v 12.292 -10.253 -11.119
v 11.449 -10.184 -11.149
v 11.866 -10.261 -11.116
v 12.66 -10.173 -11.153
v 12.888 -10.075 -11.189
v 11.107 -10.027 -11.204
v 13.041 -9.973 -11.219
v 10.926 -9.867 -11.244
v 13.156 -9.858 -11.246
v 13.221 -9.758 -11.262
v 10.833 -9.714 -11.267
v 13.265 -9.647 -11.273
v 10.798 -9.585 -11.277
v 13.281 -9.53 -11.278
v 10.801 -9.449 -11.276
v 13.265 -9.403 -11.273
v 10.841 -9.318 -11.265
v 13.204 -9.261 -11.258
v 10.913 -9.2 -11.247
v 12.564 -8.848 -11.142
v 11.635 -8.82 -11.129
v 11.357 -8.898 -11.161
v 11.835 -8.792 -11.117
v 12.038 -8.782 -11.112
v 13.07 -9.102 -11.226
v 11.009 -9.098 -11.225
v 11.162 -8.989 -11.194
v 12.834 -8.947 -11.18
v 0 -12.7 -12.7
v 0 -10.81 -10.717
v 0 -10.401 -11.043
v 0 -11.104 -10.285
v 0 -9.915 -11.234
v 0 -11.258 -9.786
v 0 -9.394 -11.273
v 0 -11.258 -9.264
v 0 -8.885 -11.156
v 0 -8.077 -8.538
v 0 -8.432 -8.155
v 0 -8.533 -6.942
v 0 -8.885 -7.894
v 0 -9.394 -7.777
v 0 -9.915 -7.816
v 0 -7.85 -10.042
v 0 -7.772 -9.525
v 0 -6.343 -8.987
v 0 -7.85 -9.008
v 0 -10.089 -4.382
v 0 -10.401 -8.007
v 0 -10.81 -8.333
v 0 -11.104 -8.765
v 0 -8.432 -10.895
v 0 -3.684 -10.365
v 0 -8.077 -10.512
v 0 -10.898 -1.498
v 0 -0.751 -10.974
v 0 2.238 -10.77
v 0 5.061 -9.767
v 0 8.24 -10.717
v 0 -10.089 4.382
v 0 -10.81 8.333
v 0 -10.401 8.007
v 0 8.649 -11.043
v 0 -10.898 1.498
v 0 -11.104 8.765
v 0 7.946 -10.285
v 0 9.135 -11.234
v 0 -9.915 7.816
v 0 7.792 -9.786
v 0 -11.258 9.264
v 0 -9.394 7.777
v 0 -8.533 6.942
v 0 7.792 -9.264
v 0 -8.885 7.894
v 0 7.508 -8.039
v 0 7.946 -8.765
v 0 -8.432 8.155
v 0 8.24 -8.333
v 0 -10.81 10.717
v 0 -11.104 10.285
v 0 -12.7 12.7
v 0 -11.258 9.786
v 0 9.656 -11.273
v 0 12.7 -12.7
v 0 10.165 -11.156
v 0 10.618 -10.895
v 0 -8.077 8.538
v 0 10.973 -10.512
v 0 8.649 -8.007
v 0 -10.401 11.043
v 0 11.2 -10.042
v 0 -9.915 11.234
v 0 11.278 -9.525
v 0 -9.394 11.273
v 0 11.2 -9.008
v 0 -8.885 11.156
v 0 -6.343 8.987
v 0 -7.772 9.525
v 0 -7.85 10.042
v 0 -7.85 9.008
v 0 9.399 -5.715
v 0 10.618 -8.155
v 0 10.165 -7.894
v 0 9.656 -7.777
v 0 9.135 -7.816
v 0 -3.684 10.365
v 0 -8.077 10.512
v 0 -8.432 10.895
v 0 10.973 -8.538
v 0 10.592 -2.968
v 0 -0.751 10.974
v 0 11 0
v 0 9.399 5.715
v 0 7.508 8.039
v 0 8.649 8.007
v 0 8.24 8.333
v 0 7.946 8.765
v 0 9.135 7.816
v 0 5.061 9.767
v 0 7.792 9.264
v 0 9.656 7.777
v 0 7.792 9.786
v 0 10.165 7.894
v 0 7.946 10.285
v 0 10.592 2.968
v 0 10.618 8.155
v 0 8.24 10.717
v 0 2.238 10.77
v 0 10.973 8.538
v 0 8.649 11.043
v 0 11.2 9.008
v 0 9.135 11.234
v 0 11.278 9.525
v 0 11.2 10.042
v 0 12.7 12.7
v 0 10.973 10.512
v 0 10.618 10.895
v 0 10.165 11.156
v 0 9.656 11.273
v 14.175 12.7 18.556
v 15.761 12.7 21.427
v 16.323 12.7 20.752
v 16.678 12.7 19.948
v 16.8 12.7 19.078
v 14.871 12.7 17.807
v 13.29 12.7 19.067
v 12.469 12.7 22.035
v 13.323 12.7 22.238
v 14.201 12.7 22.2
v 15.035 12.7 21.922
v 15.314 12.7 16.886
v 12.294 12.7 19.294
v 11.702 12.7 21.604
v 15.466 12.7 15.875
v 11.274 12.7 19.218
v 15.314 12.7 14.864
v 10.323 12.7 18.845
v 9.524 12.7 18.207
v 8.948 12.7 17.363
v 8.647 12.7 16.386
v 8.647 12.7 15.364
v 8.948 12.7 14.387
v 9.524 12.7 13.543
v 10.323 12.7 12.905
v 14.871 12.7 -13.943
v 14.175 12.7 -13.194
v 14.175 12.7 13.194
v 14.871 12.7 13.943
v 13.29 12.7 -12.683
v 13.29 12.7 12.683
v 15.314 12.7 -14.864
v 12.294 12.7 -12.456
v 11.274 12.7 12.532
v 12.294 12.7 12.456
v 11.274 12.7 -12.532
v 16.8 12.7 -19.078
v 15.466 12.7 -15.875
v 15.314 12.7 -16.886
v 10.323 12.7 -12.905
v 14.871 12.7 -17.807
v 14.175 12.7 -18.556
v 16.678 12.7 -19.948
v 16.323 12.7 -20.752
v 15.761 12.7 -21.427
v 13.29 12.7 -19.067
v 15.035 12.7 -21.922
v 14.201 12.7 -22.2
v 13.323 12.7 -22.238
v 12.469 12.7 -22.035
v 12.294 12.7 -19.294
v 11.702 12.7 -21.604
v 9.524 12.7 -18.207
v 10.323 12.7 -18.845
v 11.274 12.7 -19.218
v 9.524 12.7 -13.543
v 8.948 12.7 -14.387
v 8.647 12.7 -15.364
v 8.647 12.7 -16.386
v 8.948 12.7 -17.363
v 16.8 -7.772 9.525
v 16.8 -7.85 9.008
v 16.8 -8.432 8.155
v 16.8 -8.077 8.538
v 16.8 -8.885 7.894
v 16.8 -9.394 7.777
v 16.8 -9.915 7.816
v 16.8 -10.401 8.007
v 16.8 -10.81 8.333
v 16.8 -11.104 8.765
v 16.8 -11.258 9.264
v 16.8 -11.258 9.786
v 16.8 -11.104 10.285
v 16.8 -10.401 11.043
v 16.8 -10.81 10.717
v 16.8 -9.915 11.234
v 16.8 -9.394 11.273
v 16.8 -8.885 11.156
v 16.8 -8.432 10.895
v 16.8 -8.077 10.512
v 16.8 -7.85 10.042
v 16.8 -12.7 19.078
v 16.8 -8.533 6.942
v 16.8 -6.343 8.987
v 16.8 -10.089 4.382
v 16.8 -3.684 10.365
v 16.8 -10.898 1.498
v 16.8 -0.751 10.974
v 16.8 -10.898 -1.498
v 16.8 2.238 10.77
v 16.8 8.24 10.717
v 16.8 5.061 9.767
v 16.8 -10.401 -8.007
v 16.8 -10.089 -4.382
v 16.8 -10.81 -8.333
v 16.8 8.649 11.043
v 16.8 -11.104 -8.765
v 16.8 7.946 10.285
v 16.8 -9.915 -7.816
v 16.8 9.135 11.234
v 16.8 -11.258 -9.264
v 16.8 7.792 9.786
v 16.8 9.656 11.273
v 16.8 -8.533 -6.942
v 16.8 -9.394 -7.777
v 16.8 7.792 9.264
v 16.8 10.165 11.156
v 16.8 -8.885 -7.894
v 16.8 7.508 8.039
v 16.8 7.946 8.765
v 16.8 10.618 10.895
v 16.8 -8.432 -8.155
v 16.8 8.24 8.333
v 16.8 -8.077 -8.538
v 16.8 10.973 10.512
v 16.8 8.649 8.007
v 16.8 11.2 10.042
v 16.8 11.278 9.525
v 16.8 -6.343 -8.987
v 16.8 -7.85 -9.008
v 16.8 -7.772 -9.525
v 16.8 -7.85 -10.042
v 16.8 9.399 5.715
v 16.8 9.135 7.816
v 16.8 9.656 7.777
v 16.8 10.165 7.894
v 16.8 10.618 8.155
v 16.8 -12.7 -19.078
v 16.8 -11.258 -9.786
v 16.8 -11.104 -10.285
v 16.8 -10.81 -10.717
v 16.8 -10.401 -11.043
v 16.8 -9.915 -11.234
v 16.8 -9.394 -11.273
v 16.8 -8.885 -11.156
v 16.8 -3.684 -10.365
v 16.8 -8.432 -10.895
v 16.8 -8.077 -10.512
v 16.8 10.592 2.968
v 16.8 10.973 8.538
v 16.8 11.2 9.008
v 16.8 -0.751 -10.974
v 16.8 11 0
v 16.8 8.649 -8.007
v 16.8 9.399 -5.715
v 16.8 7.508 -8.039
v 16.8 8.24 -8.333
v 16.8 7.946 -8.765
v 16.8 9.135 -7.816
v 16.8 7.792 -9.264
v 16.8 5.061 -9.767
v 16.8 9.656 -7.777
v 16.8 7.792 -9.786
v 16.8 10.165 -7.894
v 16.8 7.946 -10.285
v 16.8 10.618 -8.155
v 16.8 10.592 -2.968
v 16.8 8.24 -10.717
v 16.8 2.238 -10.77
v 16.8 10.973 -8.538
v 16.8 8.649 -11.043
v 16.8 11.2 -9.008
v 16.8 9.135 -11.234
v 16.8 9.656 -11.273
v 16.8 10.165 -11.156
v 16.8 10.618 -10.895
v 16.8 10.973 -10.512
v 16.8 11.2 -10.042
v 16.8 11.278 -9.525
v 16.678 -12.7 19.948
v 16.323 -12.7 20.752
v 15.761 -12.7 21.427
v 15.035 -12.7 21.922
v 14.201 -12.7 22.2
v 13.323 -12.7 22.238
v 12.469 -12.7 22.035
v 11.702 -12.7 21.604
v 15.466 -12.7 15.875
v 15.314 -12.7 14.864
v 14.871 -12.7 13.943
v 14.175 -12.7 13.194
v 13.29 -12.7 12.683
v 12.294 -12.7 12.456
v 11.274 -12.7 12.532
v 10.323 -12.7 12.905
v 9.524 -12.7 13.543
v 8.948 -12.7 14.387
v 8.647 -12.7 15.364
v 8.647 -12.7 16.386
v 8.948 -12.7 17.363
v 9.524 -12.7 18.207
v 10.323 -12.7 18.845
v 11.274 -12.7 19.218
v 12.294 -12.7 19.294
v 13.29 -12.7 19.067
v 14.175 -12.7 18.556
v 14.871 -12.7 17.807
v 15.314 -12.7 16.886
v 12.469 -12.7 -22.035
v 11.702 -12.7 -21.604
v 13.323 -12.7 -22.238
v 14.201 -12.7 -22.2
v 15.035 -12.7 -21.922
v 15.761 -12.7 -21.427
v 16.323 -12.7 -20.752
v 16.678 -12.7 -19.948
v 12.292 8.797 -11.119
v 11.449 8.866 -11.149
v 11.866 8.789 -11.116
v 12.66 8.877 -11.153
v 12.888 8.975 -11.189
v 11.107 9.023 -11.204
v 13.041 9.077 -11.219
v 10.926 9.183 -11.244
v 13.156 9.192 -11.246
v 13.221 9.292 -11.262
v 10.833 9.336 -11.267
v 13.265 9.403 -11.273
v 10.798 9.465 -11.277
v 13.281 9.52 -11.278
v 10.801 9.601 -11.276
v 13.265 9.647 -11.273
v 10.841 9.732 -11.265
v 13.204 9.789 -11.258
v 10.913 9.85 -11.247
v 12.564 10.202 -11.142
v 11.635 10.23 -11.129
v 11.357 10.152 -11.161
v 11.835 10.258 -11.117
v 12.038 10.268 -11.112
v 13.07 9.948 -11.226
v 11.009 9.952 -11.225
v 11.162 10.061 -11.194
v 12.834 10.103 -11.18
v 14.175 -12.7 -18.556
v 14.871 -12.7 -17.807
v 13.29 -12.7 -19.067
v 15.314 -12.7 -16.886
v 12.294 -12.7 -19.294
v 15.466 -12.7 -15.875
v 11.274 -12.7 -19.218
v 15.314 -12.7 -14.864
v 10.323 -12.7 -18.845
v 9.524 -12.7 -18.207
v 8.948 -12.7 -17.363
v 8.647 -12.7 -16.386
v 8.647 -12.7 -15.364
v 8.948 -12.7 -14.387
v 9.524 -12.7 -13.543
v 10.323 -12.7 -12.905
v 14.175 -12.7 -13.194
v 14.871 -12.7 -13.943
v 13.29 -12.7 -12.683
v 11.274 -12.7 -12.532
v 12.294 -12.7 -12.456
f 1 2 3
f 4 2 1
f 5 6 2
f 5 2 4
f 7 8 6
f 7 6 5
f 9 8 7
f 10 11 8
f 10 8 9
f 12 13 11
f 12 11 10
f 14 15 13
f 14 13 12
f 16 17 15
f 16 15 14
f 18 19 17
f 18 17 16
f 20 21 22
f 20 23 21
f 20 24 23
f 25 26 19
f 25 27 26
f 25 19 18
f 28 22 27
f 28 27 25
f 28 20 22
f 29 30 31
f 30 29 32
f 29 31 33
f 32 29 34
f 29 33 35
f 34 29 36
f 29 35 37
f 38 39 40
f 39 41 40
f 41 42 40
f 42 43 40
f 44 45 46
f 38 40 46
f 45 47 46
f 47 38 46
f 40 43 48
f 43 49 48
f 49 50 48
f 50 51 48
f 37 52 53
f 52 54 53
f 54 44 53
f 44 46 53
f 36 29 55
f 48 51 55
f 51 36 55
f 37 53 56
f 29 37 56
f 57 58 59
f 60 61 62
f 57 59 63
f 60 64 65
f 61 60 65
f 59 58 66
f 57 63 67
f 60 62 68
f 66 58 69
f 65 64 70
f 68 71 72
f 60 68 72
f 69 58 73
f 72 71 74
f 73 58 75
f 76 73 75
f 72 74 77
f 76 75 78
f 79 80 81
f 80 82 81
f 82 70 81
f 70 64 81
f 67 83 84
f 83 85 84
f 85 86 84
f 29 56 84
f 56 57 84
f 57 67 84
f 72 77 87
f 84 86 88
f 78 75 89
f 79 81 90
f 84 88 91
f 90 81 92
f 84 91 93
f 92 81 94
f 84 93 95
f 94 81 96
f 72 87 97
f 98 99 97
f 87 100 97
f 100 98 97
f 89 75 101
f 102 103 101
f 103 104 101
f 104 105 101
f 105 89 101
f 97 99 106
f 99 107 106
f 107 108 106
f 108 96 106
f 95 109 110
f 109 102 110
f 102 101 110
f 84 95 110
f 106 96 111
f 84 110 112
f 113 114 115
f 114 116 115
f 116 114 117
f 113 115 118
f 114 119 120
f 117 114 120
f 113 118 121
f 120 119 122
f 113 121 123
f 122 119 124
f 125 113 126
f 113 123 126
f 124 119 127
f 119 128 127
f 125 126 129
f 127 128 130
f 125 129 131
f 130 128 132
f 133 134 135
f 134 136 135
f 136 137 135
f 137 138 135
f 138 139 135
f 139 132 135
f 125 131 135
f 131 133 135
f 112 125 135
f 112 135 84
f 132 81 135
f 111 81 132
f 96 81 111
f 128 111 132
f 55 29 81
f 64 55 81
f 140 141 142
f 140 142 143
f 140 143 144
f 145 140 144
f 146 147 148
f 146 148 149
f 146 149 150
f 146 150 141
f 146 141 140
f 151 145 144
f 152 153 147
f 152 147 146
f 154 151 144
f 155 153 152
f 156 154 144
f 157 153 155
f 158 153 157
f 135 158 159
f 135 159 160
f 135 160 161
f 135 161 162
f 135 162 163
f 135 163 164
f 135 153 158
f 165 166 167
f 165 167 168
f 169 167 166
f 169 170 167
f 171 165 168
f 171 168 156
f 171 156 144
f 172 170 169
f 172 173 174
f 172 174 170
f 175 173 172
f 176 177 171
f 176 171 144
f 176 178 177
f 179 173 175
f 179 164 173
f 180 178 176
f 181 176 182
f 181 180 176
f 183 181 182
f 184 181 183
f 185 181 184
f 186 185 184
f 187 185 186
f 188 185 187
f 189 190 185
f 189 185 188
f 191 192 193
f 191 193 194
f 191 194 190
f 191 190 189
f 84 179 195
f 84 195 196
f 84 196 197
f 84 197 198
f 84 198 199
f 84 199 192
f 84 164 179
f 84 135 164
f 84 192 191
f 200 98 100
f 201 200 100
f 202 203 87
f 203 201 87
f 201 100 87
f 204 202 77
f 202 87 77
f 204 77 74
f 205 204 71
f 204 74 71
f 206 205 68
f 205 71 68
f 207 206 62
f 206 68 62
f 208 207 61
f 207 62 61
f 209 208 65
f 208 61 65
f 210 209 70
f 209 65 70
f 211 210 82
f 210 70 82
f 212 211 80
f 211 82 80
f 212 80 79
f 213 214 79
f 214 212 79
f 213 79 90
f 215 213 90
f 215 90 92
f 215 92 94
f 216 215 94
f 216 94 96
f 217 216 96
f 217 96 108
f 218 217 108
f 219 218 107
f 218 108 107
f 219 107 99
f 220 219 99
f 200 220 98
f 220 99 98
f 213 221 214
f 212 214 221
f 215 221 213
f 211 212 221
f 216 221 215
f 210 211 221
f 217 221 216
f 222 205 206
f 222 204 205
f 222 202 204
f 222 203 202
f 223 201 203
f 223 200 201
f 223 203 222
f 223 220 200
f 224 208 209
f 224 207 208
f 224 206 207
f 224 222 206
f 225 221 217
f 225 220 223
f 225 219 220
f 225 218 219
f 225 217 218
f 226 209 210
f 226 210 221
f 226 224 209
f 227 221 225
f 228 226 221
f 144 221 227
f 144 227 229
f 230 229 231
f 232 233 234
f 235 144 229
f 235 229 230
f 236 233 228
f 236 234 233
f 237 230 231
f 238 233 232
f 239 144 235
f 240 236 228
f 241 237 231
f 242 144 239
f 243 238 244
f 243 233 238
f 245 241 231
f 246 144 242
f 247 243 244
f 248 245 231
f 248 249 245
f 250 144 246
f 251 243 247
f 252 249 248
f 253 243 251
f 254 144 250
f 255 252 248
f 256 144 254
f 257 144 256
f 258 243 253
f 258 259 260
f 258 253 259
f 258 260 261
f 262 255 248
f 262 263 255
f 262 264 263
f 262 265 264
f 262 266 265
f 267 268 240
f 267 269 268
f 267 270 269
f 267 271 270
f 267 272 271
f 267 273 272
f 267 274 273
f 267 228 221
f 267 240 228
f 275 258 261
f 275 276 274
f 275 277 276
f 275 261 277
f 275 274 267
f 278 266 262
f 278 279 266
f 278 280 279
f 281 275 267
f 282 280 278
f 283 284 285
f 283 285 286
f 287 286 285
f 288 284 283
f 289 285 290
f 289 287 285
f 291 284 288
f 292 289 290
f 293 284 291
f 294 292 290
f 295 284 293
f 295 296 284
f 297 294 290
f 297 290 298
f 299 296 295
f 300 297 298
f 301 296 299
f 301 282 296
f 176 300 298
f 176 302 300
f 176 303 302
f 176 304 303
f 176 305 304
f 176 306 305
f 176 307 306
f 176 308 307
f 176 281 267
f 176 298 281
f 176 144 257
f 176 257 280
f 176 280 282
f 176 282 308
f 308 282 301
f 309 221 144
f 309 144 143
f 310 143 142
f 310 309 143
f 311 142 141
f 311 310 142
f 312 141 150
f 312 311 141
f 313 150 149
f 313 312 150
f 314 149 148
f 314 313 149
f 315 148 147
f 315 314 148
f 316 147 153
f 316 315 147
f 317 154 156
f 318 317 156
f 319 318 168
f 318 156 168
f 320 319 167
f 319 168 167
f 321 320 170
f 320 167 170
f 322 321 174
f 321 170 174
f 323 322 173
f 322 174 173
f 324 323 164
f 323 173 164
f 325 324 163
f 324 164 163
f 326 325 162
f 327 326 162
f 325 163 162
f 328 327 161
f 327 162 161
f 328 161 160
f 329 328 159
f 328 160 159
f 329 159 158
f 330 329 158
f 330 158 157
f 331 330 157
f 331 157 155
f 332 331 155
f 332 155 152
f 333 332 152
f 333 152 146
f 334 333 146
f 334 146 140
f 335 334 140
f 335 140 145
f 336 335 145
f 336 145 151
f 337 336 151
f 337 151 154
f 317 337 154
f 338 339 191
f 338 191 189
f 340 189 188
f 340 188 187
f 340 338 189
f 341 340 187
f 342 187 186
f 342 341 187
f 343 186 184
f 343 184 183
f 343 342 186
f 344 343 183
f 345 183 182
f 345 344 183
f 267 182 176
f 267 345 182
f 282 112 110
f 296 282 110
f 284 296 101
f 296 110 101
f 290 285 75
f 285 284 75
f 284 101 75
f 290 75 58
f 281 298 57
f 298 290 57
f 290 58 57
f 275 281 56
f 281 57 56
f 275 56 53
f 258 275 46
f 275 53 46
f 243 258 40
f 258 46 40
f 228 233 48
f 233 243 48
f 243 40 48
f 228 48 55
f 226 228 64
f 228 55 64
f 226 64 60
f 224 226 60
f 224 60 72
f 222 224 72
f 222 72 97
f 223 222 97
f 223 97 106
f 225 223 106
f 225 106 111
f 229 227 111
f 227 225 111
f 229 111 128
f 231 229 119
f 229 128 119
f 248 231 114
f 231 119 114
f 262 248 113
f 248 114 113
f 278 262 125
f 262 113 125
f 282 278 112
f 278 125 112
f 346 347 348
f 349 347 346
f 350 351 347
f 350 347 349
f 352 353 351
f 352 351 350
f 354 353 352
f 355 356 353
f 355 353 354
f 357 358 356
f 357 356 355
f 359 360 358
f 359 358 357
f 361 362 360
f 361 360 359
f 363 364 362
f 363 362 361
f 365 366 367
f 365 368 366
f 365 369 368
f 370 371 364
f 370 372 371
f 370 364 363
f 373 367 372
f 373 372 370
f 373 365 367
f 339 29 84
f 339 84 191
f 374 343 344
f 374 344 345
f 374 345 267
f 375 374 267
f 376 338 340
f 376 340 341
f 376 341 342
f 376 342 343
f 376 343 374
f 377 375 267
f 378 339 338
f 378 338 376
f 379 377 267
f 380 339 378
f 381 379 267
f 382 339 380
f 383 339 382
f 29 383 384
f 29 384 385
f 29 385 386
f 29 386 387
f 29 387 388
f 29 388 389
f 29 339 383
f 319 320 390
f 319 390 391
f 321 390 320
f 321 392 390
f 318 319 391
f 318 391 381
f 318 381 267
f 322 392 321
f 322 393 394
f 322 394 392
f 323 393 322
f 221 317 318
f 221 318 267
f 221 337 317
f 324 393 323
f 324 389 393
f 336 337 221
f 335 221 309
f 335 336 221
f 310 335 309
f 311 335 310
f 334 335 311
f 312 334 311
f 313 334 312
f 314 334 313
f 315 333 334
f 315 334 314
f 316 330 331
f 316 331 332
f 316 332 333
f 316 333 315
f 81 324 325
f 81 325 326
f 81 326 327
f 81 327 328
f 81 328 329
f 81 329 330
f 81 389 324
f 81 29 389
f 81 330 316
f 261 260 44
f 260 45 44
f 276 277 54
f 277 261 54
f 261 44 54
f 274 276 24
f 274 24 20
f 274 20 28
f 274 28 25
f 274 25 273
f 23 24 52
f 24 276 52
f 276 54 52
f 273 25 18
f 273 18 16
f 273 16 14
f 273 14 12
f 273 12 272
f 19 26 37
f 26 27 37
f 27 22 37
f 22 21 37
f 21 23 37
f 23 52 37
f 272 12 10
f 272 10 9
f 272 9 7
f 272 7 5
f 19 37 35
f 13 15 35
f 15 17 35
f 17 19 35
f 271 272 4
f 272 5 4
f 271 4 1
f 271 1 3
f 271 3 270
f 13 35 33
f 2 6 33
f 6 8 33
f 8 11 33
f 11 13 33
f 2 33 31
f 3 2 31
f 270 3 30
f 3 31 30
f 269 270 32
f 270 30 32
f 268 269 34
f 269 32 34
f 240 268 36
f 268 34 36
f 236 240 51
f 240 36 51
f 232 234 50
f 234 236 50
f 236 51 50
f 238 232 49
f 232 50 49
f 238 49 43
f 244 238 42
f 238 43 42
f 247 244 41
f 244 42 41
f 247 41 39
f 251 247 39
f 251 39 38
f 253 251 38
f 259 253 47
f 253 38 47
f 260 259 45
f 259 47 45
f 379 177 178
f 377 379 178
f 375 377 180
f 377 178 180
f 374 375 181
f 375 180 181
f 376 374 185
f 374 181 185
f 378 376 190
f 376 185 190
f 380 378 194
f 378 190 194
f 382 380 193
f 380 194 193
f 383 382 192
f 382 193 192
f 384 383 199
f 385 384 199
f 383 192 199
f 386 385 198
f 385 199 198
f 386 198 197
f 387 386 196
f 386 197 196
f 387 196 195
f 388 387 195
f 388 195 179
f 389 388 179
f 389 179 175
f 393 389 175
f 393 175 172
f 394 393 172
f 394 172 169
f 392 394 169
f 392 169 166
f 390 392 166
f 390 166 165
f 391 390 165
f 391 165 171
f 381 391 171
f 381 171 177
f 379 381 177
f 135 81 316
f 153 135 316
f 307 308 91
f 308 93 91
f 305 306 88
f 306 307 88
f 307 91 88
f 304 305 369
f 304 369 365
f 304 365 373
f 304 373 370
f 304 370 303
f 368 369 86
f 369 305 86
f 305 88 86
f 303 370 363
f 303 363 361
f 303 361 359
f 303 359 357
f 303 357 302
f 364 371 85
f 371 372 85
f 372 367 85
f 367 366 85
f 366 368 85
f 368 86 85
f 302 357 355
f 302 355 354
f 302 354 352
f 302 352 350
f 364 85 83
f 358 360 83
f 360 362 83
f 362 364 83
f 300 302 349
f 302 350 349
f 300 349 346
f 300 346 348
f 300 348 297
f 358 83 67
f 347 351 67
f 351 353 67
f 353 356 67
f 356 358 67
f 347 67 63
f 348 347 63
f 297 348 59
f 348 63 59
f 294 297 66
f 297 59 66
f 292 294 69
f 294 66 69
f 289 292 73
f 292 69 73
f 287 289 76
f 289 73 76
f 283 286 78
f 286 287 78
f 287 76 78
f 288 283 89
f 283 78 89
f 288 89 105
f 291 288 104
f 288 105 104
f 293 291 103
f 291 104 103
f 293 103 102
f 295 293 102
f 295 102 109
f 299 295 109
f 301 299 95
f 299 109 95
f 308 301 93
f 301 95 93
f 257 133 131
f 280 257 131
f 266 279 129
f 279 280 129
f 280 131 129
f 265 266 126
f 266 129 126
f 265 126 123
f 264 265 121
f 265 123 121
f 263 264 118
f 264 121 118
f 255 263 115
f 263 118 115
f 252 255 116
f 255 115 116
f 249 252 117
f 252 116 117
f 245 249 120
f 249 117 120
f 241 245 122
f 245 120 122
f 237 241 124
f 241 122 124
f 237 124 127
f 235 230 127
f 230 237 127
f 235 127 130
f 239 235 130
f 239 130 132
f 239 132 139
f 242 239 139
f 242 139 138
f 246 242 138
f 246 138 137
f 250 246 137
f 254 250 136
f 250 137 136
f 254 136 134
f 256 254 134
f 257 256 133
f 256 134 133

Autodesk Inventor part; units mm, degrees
ref_plane "YZ Plane" through (0, 0, 0) normal (1, 0, 0) x (0, 1, 0)
ref_plane "XZ Plane" through (0, 0, 0) normal (0, 1, 0) x (-1, 0, 0)
ref_plane "XY Plane" through (0, 0, 0) normal (0, 0, 1) x (1, 0, 0)
sketch "Sketch1" plane through (0, 0, 0) normal (1, 0, 0) x (0, 1, 0)
  circle A0 centre (0, 0) radius 11
  line L0 (-12.7, 12.7) -> (12.7, 12.7)
  line L1 (12.7, 12.7) -> (12.7, -12.7)
  line L2 (12.7, -12.7) -> (-12.7, -12.7)
  line L3 (-12.7, -12.7) -> (-12.7, 12.7)
  line L4 (-12.7, 12.7) -> (12.7, -12.7) construction
  line L5 (12.7, 12.7) -> (-12.7, -12.7) construction
  line L6 (-9.525, 9.525) -> (9.525, 9.525) construction
  line L7 (9.525, 9.525) -> (9.525, -9.525) construction
  line L8 (9.525, -9.525) -> (-9.525, -9.525) construction
  line L9 (-9.525, -9.525) -> (-9.525, 9.525) construction
  line L10 (-9.525, 9.525) -> (9.525, -9.525) construction
  line L11 (9.525, 9.525) -> (-9.525, -9.525) construction
  circle A1 centre (9.525, 9.525) radius 1.7526
  circle A2 centre (-9.525, 9.525) radius 1.7526
  circle A3 centre (-9.525, -9.525) radius 1.7526
  circle A4 centre (9.525, -9.525) radius 1.7526
  dimension "d0" = 22
  dimension "d1" = 25.4
  dimension "d2" = 25.4
  dimension "d3" = 19.05
  dimension "d4" = 19.05
  dimension "d5" = 3.5052
  dimension "d8" = 360
extrude "Extrusion1" add sketch "Sketch1" along normal blind 16.8
sketch "Sketch2" plane through (0, 12.7, 12.7) normal (0, 1, 0) x (1, 0, 0)
  circle A0 centre (12.0375, -3.175) radius 4.7625
  circle A1 centre (12.0375, -3.175) radius 3.175
  line L0 (0, 0) -> (16.8, 0) projected
  line L1 (16.8, 25.4) -> (16.8, 0) projected
  line L2 (0, 12.7) -> (16.8, 12.7) construction
  line L3 (16.8, -12.7833) -> (16.8, 0)
  circle A2 centre (12.0375, 28.575) radius 4.7625
  circle A3 centre (12.0375, 28.575) radius 3.175
  line L4 (0, 25.4) -> (16.8, 25.4)
  line L5 (16.8, 38.1833) -> (16.8, 25.4)
  line L6 (0, 25.4) -> (16.8, 25.4) projected
  line L7 (0, 25.4) -> (16.8, 38.1833)
  line L8 (0, 0) -> (16.8, -12.7833)
  point P0 (16.8, -3.175)
  point P1 (16.8, 28.575)
  point P2 (15.5873, 25.4)
  point P3 (8.4877, 25.4)
  point P4 (9.1536, -6.9651)
  point P5 (8.4877, 0)
  point P6 (15.5873, 0)
  dimension "d12" = 9.525
  dimension "d13" = 6.35
extrude "Extrusion2" add sketch "Sketch2" against normal up to surface (25.4 mm away) contours A0 L0 | L3 L8 A0 | A0 L0 L3 | L8 L0 A0 | A2 L4 | L5 L4 A2 | A2 L7 L5 | A2 L4 L7 | A2 L4 picked at (16.2227, -3.5628)
thicken "Thicken1" operation cut thickness 0.254 both sides no extend neighbours no toward (0.9967573, 0, 0.0804666) faces at (15.2022, -4.2333, 16.1305)
thicken "Thicken2" operation cut thickness 0.254 both sides no extend neighbours no toward (0.9870503, 0, -0.1604113) faces at (15.1714, 4.2333, -16.3843)
fillet "Fillet4" radius 3.175 2 edges at (16.8, 0, 25.4833) (16.8, 0, -25.4833)
properties part number "Motor Sleeve" material "UHMW, Black"
